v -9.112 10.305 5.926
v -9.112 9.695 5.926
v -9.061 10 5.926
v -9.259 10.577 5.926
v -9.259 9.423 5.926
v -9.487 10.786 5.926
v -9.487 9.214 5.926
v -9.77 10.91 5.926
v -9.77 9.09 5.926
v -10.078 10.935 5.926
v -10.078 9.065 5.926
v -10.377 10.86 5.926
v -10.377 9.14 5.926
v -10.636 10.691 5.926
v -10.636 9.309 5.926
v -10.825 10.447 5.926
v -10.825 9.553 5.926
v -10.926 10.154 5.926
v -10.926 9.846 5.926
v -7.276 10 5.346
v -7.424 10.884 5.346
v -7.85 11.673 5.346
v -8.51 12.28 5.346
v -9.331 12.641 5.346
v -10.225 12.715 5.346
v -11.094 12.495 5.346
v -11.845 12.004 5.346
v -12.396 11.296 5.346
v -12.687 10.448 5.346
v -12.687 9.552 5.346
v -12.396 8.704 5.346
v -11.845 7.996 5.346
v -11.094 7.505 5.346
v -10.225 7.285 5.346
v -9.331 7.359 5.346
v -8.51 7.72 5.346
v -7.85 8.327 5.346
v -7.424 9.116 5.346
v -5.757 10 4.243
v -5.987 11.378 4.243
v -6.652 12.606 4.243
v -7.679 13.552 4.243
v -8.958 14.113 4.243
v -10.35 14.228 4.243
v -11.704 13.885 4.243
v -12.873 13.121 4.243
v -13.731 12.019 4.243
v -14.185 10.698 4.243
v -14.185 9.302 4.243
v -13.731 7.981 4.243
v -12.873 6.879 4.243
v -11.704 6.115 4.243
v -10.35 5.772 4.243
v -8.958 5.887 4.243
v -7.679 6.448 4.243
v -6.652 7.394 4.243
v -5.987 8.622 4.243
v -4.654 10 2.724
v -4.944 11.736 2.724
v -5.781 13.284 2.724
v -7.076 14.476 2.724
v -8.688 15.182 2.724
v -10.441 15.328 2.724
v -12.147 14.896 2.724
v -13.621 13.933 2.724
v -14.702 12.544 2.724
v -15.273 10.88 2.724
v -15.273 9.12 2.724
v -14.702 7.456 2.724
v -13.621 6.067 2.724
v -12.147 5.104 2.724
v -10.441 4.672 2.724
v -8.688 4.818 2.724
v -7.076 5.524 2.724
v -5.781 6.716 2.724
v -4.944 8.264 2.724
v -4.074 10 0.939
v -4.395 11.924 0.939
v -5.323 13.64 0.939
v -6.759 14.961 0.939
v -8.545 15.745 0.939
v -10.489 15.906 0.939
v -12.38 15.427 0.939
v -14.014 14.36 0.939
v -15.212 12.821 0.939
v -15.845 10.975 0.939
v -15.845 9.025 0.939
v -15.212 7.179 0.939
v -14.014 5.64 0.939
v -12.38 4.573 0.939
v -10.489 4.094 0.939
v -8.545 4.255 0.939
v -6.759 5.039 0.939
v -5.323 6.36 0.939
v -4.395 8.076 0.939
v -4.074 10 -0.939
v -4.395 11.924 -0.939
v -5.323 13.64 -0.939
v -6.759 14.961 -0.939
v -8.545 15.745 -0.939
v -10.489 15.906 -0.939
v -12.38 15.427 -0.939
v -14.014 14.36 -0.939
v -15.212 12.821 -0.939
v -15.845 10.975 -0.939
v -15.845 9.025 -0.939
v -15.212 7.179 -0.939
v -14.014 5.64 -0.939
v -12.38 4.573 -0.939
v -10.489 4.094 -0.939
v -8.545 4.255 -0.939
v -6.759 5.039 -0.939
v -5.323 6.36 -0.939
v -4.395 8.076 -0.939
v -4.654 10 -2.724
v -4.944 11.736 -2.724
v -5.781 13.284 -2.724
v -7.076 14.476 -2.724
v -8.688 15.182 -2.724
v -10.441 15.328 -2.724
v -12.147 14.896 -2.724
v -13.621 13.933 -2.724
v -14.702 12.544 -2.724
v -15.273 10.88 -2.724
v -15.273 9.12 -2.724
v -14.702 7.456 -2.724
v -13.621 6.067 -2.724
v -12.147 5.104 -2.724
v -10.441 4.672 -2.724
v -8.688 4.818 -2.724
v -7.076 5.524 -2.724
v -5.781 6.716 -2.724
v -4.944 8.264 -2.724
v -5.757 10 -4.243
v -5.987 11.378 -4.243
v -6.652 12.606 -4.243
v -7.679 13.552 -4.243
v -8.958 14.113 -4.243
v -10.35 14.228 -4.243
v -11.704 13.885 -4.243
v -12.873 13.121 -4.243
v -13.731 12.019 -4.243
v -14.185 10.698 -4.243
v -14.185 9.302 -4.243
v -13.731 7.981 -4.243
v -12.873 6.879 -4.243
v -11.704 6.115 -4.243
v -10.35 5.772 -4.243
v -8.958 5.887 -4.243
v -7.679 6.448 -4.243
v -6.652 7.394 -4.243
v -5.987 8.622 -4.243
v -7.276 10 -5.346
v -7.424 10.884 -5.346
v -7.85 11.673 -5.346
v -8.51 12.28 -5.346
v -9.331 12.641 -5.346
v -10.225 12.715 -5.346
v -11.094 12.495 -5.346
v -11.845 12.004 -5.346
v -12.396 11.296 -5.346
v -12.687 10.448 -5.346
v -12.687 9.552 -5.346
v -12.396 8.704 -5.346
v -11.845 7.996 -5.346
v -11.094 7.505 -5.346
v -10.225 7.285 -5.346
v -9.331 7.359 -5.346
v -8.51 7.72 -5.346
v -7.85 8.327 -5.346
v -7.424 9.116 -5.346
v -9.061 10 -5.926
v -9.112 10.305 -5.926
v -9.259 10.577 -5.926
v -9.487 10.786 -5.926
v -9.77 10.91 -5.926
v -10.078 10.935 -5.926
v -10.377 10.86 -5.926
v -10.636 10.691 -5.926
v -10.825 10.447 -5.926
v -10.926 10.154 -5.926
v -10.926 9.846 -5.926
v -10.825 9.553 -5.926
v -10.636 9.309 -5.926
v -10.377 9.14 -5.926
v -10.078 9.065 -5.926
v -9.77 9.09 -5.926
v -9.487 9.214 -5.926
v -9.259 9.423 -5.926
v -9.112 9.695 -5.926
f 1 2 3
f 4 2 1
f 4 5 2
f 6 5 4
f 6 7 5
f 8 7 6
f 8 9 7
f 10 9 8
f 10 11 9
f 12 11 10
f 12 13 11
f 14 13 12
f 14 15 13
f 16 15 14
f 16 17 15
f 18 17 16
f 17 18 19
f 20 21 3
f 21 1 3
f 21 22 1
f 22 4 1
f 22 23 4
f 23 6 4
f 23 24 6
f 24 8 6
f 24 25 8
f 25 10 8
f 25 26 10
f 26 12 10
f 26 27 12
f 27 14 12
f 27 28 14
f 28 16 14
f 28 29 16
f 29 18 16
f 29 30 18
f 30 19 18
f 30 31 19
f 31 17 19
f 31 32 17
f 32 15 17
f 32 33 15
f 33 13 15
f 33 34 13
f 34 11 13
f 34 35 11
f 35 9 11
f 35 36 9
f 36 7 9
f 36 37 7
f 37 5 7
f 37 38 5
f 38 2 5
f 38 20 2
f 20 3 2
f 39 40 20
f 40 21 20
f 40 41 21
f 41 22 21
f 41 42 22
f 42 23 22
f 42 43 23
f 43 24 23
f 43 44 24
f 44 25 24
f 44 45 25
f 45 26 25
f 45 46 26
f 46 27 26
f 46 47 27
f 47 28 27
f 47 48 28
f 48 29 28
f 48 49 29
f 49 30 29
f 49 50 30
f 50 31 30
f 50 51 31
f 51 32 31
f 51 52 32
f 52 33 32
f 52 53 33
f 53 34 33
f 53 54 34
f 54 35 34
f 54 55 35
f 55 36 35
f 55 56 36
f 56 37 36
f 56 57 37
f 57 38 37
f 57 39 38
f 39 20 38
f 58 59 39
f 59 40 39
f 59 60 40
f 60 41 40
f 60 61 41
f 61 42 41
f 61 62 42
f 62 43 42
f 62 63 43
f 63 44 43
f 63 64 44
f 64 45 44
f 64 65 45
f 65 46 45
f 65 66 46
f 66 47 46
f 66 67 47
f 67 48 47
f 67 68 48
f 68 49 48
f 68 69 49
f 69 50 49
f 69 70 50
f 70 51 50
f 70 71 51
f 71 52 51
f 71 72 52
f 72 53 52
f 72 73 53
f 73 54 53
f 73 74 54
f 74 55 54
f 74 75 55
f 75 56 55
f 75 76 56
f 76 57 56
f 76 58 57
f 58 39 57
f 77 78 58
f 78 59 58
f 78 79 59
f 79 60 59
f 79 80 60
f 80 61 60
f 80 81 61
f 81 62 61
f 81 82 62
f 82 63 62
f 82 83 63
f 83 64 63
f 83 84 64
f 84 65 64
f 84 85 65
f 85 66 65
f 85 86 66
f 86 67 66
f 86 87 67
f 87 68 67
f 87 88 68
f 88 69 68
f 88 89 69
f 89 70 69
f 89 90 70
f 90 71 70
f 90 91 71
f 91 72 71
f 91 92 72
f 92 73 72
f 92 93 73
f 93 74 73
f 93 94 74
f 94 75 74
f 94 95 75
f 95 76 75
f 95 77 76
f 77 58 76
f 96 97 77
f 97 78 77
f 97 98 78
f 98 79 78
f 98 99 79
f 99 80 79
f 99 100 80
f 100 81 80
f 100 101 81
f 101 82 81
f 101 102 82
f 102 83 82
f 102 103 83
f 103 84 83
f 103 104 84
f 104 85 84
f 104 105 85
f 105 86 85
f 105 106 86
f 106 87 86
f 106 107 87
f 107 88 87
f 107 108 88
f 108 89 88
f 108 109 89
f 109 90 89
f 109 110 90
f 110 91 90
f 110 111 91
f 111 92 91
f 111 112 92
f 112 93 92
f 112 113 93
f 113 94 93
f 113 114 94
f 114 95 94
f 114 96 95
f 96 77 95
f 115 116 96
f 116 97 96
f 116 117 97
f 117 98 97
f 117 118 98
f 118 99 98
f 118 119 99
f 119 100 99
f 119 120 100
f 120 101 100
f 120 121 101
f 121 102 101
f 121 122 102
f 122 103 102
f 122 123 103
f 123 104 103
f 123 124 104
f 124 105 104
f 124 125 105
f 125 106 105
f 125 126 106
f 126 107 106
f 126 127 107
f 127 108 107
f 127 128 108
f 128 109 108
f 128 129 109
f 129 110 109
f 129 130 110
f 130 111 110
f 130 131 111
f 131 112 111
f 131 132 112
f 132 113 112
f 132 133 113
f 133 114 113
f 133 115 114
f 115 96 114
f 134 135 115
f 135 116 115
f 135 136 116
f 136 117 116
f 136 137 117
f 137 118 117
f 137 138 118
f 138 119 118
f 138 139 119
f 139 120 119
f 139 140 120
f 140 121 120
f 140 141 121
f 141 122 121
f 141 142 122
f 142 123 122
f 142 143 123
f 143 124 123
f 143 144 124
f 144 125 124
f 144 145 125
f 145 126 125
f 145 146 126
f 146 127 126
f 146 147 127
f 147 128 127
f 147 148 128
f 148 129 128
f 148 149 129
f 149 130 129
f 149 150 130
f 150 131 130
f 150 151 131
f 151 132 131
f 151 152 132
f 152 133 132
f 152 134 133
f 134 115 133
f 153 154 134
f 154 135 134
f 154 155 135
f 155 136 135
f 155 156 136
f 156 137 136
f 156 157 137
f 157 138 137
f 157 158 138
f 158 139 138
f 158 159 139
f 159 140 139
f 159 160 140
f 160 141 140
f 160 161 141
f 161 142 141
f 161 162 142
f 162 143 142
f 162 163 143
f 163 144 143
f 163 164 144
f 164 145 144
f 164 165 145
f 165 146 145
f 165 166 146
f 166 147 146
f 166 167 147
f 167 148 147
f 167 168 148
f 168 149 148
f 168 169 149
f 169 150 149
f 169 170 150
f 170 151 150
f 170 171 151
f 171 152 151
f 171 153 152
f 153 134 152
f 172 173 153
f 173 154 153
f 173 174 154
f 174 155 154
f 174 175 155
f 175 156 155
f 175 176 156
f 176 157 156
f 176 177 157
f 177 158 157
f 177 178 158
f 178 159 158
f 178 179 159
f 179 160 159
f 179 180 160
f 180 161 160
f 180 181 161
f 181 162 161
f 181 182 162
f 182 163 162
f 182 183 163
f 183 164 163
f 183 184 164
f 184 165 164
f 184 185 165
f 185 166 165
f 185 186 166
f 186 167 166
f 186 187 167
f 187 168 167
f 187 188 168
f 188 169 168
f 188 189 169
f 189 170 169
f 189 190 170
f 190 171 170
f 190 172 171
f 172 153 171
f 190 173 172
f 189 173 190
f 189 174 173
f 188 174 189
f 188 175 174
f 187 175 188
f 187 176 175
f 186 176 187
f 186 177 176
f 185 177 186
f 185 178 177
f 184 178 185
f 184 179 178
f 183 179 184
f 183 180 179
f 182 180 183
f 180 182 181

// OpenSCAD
// Generated by generate_scads.py
translate([-10,10,0]) {
  sphere(r=6);
}
